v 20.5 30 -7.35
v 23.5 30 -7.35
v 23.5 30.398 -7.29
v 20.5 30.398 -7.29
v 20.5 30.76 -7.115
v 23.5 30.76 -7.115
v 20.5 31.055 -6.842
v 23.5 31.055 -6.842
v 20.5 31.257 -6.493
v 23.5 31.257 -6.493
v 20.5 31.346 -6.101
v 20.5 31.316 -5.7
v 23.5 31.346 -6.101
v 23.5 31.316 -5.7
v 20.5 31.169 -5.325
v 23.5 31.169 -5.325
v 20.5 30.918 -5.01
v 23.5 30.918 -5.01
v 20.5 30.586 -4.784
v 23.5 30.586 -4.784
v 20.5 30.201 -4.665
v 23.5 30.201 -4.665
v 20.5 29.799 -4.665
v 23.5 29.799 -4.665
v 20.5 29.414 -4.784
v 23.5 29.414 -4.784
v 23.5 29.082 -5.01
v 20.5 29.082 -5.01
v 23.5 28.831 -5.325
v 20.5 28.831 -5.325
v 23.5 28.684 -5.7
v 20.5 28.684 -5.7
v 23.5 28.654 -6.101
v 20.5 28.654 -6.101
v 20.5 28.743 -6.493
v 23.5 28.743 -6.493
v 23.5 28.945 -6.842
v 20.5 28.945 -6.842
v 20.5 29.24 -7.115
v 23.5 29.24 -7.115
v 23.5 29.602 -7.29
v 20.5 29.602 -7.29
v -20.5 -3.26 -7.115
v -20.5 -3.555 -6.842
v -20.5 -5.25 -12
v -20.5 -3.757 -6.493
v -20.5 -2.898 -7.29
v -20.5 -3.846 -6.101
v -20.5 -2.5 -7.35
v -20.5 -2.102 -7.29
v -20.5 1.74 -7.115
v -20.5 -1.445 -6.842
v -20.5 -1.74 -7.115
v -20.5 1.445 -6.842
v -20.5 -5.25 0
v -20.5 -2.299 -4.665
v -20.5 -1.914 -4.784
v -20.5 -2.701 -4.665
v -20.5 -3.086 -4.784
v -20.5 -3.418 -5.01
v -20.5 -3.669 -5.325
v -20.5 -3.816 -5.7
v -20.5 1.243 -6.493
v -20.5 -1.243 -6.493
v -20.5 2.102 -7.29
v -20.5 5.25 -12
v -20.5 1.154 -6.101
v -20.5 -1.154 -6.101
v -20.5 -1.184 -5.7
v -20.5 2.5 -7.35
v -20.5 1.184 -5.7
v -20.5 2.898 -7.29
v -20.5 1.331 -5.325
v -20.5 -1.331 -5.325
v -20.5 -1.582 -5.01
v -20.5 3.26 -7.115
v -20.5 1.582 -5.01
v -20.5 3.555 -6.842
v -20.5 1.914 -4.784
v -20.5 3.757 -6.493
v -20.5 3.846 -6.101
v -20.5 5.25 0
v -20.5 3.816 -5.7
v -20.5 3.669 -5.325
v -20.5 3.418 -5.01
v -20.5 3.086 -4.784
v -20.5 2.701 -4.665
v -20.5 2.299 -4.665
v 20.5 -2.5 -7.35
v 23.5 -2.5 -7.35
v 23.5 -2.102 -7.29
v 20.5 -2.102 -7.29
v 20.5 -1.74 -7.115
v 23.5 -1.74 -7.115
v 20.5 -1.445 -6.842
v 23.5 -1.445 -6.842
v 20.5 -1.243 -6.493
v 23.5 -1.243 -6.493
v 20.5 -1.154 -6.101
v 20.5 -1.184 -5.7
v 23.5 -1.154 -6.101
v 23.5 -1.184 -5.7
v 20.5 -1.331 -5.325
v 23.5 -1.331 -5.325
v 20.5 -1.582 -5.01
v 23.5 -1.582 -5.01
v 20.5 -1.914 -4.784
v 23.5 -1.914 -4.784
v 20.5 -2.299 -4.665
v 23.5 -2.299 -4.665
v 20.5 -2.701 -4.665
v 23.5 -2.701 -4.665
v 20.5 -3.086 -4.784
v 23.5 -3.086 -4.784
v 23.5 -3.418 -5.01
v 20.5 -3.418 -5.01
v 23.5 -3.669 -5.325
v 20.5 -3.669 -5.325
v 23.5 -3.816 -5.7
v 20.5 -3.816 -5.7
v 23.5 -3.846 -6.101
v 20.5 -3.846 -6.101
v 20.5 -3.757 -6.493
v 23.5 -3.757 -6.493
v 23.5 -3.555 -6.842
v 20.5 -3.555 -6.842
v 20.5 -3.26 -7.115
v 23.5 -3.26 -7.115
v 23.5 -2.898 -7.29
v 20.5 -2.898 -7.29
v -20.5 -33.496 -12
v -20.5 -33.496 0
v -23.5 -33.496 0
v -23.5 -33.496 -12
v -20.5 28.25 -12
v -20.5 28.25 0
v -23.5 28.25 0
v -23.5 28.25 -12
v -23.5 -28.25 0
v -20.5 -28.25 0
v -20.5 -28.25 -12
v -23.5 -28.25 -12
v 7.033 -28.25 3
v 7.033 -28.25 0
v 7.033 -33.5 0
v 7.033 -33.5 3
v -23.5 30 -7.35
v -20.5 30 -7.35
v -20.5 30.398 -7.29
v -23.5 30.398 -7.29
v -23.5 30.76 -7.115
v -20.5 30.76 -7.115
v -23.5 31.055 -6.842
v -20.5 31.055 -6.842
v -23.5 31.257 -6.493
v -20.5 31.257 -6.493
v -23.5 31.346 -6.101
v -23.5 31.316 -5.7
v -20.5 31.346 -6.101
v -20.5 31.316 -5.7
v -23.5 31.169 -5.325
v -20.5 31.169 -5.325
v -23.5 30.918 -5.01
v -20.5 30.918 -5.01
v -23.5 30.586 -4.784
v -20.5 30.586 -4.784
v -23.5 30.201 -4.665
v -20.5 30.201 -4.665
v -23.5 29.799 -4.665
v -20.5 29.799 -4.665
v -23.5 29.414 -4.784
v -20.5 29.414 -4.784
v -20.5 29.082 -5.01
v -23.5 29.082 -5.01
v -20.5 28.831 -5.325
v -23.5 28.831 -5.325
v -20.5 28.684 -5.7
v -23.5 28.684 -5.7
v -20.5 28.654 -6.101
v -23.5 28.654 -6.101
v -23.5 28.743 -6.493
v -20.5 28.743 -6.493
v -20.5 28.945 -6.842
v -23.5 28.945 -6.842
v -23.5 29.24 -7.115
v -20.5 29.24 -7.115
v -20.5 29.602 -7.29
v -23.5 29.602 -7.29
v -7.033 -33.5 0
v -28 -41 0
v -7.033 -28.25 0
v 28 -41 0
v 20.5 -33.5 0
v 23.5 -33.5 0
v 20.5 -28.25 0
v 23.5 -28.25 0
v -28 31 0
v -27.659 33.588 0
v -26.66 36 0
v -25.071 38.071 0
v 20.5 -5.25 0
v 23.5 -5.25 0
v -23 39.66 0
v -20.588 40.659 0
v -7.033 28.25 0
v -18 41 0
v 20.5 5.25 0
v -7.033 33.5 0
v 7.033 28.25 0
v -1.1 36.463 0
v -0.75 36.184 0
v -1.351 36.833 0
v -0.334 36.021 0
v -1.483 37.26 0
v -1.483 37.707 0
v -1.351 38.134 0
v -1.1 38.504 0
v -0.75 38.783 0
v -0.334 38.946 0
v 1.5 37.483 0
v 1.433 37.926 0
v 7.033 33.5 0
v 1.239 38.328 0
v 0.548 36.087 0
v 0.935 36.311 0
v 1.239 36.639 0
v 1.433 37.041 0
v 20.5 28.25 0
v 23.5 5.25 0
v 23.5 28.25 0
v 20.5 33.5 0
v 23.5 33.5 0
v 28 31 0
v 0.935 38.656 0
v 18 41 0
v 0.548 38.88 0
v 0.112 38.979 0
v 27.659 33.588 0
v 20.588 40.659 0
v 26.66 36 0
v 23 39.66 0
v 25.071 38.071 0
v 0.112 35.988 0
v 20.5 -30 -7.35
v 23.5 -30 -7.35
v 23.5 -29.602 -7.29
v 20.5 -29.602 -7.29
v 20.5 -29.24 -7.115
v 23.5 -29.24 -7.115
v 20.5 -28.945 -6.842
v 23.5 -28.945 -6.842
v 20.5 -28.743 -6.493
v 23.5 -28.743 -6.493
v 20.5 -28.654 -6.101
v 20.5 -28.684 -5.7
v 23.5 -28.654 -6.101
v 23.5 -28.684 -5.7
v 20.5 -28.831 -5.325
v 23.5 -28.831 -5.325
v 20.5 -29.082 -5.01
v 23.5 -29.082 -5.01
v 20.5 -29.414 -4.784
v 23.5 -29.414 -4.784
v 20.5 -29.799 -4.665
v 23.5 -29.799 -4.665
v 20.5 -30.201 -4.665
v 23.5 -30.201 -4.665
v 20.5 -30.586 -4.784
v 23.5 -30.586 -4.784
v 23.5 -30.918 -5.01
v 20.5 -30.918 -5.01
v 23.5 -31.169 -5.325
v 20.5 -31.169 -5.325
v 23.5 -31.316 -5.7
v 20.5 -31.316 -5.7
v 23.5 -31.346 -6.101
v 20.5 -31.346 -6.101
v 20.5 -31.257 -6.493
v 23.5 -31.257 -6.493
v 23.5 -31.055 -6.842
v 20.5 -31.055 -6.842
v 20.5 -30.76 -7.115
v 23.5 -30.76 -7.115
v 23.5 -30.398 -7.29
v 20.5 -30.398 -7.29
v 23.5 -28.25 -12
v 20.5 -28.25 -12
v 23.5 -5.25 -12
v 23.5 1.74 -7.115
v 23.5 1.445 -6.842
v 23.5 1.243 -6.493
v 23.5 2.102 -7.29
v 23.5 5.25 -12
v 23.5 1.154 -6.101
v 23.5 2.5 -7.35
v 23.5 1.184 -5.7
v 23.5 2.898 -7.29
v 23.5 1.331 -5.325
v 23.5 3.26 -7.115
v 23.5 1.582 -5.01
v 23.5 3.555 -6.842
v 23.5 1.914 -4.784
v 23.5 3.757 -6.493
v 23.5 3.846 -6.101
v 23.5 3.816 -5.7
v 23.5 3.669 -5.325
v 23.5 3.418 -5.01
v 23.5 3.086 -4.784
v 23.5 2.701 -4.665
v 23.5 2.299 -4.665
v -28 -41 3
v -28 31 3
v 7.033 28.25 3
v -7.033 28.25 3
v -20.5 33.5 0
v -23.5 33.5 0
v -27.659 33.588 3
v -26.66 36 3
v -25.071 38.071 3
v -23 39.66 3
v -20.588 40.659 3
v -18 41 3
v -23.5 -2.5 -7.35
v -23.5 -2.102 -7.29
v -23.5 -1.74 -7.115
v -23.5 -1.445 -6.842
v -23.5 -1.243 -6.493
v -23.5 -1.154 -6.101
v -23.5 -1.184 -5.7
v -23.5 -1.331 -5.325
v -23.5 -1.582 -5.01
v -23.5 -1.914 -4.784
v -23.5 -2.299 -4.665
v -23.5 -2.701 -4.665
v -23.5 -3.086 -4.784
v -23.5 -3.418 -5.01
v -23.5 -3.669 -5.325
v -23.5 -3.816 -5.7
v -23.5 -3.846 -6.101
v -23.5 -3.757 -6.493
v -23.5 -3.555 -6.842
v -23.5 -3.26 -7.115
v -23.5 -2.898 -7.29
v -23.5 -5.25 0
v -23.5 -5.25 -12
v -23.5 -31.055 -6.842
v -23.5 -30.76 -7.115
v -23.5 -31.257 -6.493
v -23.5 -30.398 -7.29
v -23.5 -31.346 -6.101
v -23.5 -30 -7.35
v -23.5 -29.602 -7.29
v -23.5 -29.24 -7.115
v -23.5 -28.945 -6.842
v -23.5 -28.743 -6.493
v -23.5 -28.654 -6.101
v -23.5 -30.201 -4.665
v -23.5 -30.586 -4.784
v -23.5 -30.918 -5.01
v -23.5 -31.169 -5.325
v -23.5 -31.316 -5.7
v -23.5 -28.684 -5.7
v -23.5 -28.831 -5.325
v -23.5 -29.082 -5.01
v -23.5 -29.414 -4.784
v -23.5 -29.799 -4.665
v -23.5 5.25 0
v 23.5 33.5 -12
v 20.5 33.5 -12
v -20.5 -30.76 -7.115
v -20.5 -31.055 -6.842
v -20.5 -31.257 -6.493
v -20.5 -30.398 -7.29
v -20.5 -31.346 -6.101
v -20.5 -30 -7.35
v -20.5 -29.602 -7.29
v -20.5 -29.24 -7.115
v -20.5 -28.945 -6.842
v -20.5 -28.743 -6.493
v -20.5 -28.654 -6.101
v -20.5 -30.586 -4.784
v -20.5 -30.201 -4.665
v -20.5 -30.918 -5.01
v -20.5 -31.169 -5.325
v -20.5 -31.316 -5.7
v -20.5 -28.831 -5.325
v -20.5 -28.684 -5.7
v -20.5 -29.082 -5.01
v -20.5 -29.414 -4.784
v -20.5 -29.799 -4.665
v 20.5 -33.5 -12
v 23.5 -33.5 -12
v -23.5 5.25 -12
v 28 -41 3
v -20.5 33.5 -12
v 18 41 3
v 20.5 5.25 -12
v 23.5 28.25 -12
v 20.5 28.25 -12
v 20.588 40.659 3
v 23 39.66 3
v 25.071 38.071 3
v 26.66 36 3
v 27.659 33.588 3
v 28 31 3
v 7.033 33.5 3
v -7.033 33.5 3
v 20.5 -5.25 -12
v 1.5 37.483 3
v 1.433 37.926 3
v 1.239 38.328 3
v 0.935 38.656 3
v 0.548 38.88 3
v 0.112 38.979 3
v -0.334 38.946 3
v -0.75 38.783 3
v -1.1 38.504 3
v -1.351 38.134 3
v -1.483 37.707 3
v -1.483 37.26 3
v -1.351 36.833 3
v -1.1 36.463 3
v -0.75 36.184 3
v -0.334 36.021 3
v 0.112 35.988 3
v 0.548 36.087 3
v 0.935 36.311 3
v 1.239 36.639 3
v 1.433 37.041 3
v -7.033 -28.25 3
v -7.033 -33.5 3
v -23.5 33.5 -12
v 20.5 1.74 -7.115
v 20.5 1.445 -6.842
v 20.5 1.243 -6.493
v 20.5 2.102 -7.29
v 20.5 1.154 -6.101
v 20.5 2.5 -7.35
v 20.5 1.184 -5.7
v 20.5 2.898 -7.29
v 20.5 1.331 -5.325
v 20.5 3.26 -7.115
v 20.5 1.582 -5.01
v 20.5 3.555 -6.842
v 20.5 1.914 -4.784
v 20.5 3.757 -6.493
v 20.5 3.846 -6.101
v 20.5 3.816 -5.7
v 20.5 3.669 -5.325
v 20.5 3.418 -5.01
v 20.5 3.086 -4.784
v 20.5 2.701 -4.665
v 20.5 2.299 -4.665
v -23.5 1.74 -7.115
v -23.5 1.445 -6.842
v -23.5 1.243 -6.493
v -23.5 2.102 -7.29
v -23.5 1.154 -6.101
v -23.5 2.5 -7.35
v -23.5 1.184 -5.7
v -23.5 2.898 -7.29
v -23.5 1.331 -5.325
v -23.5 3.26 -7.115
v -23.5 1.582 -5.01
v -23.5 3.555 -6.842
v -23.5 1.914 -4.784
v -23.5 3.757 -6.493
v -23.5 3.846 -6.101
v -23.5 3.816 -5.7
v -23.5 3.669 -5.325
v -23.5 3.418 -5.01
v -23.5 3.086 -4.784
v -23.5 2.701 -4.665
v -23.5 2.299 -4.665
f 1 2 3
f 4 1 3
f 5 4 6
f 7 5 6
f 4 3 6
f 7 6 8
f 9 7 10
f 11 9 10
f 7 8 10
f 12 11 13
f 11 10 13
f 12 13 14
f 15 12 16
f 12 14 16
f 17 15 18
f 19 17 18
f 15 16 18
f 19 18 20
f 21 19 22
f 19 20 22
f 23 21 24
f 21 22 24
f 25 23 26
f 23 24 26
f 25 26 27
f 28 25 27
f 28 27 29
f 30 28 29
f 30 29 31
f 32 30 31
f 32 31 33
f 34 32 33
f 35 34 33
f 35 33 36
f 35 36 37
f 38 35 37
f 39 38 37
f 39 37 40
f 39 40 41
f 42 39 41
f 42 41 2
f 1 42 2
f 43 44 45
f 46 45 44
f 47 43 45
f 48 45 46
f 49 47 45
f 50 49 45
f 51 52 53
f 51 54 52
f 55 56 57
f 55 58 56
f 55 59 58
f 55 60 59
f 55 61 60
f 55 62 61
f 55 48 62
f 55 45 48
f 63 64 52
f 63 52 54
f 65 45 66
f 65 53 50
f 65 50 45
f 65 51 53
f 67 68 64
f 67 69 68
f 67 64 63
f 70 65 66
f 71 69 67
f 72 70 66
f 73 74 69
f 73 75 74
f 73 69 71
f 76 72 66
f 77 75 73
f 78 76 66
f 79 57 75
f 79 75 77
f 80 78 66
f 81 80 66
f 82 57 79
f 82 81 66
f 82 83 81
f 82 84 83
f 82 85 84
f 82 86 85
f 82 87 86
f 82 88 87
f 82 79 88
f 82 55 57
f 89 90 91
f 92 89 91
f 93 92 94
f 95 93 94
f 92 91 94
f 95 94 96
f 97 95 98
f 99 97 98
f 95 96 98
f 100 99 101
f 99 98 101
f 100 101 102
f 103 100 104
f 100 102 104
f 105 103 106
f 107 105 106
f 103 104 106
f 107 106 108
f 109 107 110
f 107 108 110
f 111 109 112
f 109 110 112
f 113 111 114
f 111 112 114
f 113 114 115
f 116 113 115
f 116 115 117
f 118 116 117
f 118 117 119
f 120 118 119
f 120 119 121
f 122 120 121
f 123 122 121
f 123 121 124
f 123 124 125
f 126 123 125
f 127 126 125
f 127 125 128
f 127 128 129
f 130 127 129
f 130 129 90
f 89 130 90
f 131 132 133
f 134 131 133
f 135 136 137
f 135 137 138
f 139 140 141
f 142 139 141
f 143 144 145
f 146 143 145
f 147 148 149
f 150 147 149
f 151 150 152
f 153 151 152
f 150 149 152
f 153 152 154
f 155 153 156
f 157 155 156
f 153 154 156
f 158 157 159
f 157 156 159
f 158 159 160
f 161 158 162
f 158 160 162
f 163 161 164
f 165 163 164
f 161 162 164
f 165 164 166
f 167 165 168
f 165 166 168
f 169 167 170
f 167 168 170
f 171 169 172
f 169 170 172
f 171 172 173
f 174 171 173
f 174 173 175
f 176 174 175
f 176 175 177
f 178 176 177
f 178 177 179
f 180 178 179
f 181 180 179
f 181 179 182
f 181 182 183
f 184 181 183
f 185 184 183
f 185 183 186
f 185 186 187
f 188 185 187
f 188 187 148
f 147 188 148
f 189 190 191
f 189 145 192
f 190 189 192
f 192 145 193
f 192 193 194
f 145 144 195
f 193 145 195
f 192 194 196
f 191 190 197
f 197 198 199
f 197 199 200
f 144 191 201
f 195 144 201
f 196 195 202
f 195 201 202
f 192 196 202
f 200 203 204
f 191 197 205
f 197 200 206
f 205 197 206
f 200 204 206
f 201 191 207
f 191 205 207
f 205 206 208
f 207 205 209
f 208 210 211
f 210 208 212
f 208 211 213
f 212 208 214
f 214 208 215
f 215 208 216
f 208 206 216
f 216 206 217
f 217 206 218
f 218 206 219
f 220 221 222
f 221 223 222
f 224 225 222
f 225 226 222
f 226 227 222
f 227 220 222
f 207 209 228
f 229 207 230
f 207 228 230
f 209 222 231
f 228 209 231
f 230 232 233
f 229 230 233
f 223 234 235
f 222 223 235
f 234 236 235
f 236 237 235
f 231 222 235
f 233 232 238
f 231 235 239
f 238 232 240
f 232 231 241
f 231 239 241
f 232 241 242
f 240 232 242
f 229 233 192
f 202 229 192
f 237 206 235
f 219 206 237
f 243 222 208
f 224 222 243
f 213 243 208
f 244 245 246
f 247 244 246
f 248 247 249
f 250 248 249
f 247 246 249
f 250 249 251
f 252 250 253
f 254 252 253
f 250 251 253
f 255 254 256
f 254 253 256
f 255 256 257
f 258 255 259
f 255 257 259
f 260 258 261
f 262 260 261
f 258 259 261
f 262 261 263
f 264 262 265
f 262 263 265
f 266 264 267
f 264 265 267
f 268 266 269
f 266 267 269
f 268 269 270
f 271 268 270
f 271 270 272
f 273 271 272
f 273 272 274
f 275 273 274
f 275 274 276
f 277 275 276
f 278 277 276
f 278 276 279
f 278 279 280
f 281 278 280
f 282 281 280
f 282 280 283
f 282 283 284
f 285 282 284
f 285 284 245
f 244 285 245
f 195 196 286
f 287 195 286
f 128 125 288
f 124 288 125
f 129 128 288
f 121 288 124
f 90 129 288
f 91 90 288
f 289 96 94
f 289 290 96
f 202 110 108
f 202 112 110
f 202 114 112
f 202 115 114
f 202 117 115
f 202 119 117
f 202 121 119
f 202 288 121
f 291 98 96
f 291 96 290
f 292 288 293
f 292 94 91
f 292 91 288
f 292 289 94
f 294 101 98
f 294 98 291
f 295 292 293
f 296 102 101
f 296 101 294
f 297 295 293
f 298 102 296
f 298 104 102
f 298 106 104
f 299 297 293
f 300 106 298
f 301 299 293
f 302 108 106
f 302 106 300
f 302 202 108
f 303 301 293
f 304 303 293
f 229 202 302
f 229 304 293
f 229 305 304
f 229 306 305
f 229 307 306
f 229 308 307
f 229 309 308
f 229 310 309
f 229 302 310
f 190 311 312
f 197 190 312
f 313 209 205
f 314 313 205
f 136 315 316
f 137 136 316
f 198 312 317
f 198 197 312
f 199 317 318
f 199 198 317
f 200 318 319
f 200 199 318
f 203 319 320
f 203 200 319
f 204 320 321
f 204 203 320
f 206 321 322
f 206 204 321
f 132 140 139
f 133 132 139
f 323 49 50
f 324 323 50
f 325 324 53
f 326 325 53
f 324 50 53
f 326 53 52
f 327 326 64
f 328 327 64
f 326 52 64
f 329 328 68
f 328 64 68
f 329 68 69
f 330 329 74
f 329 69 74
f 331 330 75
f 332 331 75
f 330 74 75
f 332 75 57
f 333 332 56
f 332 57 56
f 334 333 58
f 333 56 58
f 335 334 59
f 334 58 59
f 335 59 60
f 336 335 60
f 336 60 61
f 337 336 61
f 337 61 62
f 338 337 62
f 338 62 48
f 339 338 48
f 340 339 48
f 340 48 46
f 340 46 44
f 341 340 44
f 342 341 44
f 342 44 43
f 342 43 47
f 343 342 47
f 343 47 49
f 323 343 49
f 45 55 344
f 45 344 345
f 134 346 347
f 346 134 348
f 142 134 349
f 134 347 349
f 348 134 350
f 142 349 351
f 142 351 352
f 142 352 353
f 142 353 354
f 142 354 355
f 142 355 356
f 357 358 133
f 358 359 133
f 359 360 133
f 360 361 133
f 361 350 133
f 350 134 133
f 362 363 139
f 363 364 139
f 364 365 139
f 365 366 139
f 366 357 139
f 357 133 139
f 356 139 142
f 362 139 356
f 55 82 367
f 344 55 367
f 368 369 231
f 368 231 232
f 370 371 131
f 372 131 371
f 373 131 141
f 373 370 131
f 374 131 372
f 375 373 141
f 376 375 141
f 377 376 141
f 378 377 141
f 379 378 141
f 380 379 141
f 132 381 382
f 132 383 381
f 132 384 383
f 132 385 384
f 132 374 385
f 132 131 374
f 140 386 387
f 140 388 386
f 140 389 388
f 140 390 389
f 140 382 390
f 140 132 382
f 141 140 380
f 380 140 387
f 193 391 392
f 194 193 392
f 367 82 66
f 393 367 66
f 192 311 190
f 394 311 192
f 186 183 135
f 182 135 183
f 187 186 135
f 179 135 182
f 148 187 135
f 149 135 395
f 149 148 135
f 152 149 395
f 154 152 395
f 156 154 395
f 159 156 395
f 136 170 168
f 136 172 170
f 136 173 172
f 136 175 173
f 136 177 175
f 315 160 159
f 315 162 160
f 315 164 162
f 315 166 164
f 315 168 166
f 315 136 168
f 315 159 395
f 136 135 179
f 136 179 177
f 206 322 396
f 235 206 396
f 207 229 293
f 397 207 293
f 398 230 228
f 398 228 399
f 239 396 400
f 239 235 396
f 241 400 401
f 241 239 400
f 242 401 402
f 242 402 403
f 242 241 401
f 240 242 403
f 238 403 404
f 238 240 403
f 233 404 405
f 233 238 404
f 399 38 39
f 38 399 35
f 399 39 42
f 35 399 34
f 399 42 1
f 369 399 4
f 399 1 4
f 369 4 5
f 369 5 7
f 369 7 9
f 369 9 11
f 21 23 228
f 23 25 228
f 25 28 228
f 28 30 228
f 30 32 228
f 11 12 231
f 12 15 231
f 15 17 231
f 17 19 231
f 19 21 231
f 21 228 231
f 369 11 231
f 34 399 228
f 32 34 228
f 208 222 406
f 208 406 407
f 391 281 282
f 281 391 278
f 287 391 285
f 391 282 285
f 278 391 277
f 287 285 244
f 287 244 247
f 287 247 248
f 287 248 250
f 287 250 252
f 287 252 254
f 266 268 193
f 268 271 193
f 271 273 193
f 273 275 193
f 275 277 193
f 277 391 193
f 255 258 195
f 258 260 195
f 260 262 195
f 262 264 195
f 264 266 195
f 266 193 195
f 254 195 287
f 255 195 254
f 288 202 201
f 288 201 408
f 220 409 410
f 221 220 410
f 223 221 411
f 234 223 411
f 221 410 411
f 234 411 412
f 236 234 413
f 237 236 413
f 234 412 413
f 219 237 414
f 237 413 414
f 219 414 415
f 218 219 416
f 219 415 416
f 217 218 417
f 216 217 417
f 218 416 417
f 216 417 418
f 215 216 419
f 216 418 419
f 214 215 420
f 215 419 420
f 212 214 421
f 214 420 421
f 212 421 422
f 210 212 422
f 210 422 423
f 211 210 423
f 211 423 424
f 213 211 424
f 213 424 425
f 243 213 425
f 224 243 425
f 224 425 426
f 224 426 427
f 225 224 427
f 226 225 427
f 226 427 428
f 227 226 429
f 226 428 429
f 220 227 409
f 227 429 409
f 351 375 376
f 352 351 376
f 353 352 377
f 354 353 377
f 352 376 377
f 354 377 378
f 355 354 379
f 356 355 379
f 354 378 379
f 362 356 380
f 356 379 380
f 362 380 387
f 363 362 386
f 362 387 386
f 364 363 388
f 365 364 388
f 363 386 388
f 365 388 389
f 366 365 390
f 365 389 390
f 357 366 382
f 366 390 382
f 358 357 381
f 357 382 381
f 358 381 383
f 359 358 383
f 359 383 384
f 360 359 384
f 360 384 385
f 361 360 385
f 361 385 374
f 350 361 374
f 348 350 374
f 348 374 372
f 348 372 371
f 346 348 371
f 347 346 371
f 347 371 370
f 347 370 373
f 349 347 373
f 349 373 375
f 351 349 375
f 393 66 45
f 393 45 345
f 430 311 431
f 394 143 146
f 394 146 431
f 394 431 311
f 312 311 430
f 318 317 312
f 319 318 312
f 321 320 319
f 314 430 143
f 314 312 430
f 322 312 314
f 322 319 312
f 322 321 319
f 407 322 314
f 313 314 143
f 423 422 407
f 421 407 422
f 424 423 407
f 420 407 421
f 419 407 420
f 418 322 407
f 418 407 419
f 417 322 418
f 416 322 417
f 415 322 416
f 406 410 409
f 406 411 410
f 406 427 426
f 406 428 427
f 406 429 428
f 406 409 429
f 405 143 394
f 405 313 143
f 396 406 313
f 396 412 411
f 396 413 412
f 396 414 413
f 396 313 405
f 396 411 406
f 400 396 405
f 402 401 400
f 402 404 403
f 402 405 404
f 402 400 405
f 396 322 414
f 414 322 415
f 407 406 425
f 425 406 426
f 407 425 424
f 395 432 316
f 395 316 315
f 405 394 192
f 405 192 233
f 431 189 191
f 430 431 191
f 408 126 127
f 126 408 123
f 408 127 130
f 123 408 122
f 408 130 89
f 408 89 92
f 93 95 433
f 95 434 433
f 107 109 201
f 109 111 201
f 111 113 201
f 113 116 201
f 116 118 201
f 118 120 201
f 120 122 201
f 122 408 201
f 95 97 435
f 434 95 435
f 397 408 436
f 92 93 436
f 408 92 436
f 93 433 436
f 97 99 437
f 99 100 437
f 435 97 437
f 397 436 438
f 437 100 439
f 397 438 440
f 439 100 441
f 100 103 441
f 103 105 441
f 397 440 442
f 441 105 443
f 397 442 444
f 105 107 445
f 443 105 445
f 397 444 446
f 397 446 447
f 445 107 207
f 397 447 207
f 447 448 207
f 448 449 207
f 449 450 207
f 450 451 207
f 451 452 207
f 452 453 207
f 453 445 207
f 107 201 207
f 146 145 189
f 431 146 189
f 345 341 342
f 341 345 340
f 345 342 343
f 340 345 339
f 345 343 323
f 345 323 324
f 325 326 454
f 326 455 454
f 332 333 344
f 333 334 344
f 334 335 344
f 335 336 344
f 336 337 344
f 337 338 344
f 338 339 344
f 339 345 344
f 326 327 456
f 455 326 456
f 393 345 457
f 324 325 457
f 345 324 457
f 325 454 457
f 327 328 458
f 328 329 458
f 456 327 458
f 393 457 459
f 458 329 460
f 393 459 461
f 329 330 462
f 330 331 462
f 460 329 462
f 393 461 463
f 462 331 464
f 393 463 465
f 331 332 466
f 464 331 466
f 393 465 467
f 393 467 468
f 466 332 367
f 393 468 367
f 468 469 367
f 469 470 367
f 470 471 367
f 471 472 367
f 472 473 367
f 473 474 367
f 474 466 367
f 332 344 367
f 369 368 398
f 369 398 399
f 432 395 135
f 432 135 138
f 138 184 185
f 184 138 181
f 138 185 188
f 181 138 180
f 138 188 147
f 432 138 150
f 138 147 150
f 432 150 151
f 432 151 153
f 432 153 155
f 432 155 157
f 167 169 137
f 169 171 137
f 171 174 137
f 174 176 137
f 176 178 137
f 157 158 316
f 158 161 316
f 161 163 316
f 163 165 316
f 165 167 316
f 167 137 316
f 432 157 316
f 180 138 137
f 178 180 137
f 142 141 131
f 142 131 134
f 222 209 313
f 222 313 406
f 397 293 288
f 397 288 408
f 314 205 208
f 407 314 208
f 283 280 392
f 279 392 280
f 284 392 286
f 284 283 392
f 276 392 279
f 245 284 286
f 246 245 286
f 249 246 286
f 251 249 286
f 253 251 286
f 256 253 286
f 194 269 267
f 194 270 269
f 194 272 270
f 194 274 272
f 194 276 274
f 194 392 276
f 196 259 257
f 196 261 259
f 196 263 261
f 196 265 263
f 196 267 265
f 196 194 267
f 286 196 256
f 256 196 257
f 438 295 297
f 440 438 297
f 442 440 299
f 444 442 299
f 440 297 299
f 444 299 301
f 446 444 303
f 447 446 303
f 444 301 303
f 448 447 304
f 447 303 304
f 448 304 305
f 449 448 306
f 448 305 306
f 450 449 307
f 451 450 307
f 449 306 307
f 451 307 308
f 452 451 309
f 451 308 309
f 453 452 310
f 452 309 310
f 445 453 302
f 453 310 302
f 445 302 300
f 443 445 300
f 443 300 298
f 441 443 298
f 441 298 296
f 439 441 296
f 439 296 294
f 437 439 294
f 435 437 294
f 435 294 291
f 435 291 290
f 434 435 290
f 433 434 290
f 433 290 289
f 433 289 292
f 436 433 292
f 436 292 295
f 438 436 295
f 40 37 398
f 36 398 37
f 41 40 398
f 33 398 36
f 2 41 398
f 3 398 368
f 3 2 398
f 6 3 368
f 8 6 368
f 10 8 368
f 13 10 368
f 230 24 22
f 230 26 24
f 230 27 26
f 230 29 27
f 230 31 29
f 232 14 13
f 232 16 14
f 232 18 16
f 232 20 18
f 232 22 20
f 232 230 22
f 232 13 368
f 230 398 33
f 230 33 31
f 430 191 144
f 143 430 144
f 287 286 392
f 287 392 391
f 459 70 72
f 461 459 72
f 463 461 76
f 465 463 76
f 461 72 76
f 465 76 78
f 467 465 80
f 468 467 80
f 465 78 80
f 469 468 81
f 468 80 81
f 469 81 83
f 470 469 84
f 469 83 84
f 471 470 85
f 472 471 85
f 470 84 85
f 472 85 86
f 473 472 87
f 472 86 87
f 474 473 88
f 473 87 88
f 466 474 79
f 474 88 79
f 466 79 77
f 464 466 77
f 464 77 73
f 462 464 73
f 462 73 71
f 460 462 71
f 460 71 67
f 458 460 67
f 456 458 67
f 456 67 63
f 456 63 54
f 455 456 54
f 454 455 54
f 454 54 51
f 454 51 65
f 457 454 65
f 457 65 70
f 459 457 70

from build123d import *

# Parameters (mm, degrees)
SKETCH_1_W          = 48
SKETCH_1_H          = 67
EXTRUDE_2_DEPTH     = 3
SKETCH_3_W          = 3
SKETCH_3_H          = 67
SKETCH_3_H_2        = 66.995889348
EXTRUDE_3_DEPTH     = 12
SKETCH_4_R          = 1.35
SKETCH_4_W          = 12
SKETCH_4_H          = 23
CUT_EXTRUDE_1_DEPTH = 65
SKETCH_5_W          = 18.288137738
SKETCH_5_H          = 10.5
CUT_EXTRUDE_2_DEPTH = 65
SKETCH_6_W          = 3.5
SKETCH_6_H          = 67
SKETCH_6_W_2        = 0.25
CUT_EXTRUDE_3_DEPTH = 65
SKETCH_7_W          = 56
SKETCH_7_H          = 82
EXTRUDE_4_DEPTH     = 3
SKETCH_9_W          = 14.065102052
SKETCH_9_H          = 5.25
CUT_EXTRUDE_4_DEPTH = 3
SKETCH_10_R         = 1.5
CUT_EXTRUDE_5_DEPTH = 3
FILLET_2_R          = 10


with BuildPart() as part:
    # 草图1 → 凸台-拉伸2 (new body)
    with BuildSketch(Plane.XY):
        Rectangle(SKETCH_1_W, SKETCH_1_H)
    extrude(amount=EXTRUDE_2_DEPTH)

    # 草图3 → 凸台-拉伸3 (add)
    with BuildSketch(Plane(origin=(0, 0, 0), x_dir=(-1, 0, 0), z_dir=(0, 0, -1))):
        with Locations((-22, 0)):
            Rectangle(SKETCH_3_W, SKETCH_3_H)
        with Locations((22, 0.002055326)):
            Rectangle(SKETCH_3_W, SKETCH_3_H_2)
    extrude(amount=EXTRUDE_3_DEPTH)

    # 草图4 → 切除-拉伸1 (cut)
    with BuildSketch(Plane(origin=(23.5, 0, 0), x_dir=(0, 0, -1), z_dir=(1, 0, 0))):
        with Locations((6, 2.5)):
            Circle(SKETCH_4_R)
        with Locations((6, 30)):
            Circle(SKETCH_4_R)
        with Locations((6, -2.5)):
            Circle(SKETCH_4_R)
        with Locations((6, -30)):
            Circle(SKETCH_4_R)
        with Locations((6, -16.75)):
            Rectangle(SKETCH_4_W, SKETCH_4_H)
        with Locations((6, 16.75)):
            Rectangle(SKETCH_4_W, SKETCH_4_H)
    extrude(amount=-CUT_EXTRUDE_1_DEPTH, mode=Mode.SUBTRACT)

    # 草图5 → 切除-拉伸2 (cut)
    with BuildSketch(Plane(origin=(0, 0, 0), x_dir=(-1, 0, 0), z_dir=(0, 0, -1))):
        Rectangle(SKETCH_5_W, SKETCH_5_H)
    extrude(amount=-CUT_EXTRUDE_2_DEPTH, mode=Mode.SUBTRACT)

    # 草图6 → 切除-拉伸3 (cut)
    with BuildSketch(Plane(origin=(0, 0, 0), x_dir=(-1, 0, 0), z_dir=(0, 0, -1))):
        with Locations((22.25, 0)):
            Rectangle(SKETCH_6_W, SKETCH_6_H)
        with Locations((-23.875, 0)):
            Rectangle(SKETCH_6_W_2, SKETCH_6_H)
    extrude(amount=-CUT_EXTRUDE_3_DEPTH, mode=Mode.SUBTRACT)


with BuildPart() as cut_extrude_3_piece_1:
    # of the separate pieces the step leaves, piece 1, a body of its own (cut_extrude_3_pieces)
    add(part.part.solids().sort_by_distance((23.75, -33.5, 0))[0])

    # 草图7 → 凸台-拉伸4 (add)
    with BuildSketch(Plane.XY.offset(3)):
        Rectangle(SKETCH_7_W, SKETCH_7_H)
    extrude(amount=-EXTRUDE_4_DEPTH)

    # 草图9 → 切除-拉伸4 (cut)
    with BuildSketch(Plane(origin=(0, 0, 0), x_dir=(-1, 0, 0), z_dir=(0, 0, -1))):
        with Locations((0, 30.875)):
            Rectangle(SKETCH_9_W, SKETCH_9_H)
        Polygon((0, -28.25), (-7.032551026, -28.25), (-7.032551026, -33.5), (7.032551026, -33.5), (7.032551026, -28.25), align=None)
    extrude(amount=-CUT_EXTRUDE_4_DEPTH, mode=Mode.SUBTRACT)

    # 草图10 → 切除-拉伸5 (cut)
    with BuildSketch(Plane.XY.offset(3)):
        with Locations((0, 37.483485188)):
            Circle(SKETCH_10_R)
    extrude(amount=-CUT_EXTRUDE_5_DEPTH, mode=Mode.SUBTRACT)

    # 圆角2
    fillet_2_edges = [cut_extrude_3_piece_1.edges().sort_by_distance(p)[0] for p in [
        (-28, 41, 1.5),
        (28, 41, 1.5),
    ]]
    fillet(fillet_2_edges, radius=FILLET_2_R)


with BuildPart() as cut_extrude_3_piece_2:
    # of the separate pieces the step leaves, piece 2, a body of its own (cut_extrude_3_pieces)
    add(part.part.solids().sort_by_distance((-20.5, 5.25, -12))[0])


with BuildPart() as cut_extrude_3_piece_3:
    # of the separate pieces the step leaves, piece 3, a body of its own (cut_extrude_3_pieces)
    add(part.part.solids().sort_by_distance((-20.5, 33.5, -12))[0])


with BuildPart() as cut_extrude_3_piece_4:
    # of the separate pieces the step leaves, piece 4, a body of its own (cut_extrude_3_pieces)
    add(part.part.solids().sort_by_distance((-20.5, -28.25, -12))[0])


solid = Compound([cut_extrude_3_piece_1.part, cut_extrude_3_piece_2.part, cut_extrude_3_piece_3.part, cut_extrude_3_piece_4.part])
